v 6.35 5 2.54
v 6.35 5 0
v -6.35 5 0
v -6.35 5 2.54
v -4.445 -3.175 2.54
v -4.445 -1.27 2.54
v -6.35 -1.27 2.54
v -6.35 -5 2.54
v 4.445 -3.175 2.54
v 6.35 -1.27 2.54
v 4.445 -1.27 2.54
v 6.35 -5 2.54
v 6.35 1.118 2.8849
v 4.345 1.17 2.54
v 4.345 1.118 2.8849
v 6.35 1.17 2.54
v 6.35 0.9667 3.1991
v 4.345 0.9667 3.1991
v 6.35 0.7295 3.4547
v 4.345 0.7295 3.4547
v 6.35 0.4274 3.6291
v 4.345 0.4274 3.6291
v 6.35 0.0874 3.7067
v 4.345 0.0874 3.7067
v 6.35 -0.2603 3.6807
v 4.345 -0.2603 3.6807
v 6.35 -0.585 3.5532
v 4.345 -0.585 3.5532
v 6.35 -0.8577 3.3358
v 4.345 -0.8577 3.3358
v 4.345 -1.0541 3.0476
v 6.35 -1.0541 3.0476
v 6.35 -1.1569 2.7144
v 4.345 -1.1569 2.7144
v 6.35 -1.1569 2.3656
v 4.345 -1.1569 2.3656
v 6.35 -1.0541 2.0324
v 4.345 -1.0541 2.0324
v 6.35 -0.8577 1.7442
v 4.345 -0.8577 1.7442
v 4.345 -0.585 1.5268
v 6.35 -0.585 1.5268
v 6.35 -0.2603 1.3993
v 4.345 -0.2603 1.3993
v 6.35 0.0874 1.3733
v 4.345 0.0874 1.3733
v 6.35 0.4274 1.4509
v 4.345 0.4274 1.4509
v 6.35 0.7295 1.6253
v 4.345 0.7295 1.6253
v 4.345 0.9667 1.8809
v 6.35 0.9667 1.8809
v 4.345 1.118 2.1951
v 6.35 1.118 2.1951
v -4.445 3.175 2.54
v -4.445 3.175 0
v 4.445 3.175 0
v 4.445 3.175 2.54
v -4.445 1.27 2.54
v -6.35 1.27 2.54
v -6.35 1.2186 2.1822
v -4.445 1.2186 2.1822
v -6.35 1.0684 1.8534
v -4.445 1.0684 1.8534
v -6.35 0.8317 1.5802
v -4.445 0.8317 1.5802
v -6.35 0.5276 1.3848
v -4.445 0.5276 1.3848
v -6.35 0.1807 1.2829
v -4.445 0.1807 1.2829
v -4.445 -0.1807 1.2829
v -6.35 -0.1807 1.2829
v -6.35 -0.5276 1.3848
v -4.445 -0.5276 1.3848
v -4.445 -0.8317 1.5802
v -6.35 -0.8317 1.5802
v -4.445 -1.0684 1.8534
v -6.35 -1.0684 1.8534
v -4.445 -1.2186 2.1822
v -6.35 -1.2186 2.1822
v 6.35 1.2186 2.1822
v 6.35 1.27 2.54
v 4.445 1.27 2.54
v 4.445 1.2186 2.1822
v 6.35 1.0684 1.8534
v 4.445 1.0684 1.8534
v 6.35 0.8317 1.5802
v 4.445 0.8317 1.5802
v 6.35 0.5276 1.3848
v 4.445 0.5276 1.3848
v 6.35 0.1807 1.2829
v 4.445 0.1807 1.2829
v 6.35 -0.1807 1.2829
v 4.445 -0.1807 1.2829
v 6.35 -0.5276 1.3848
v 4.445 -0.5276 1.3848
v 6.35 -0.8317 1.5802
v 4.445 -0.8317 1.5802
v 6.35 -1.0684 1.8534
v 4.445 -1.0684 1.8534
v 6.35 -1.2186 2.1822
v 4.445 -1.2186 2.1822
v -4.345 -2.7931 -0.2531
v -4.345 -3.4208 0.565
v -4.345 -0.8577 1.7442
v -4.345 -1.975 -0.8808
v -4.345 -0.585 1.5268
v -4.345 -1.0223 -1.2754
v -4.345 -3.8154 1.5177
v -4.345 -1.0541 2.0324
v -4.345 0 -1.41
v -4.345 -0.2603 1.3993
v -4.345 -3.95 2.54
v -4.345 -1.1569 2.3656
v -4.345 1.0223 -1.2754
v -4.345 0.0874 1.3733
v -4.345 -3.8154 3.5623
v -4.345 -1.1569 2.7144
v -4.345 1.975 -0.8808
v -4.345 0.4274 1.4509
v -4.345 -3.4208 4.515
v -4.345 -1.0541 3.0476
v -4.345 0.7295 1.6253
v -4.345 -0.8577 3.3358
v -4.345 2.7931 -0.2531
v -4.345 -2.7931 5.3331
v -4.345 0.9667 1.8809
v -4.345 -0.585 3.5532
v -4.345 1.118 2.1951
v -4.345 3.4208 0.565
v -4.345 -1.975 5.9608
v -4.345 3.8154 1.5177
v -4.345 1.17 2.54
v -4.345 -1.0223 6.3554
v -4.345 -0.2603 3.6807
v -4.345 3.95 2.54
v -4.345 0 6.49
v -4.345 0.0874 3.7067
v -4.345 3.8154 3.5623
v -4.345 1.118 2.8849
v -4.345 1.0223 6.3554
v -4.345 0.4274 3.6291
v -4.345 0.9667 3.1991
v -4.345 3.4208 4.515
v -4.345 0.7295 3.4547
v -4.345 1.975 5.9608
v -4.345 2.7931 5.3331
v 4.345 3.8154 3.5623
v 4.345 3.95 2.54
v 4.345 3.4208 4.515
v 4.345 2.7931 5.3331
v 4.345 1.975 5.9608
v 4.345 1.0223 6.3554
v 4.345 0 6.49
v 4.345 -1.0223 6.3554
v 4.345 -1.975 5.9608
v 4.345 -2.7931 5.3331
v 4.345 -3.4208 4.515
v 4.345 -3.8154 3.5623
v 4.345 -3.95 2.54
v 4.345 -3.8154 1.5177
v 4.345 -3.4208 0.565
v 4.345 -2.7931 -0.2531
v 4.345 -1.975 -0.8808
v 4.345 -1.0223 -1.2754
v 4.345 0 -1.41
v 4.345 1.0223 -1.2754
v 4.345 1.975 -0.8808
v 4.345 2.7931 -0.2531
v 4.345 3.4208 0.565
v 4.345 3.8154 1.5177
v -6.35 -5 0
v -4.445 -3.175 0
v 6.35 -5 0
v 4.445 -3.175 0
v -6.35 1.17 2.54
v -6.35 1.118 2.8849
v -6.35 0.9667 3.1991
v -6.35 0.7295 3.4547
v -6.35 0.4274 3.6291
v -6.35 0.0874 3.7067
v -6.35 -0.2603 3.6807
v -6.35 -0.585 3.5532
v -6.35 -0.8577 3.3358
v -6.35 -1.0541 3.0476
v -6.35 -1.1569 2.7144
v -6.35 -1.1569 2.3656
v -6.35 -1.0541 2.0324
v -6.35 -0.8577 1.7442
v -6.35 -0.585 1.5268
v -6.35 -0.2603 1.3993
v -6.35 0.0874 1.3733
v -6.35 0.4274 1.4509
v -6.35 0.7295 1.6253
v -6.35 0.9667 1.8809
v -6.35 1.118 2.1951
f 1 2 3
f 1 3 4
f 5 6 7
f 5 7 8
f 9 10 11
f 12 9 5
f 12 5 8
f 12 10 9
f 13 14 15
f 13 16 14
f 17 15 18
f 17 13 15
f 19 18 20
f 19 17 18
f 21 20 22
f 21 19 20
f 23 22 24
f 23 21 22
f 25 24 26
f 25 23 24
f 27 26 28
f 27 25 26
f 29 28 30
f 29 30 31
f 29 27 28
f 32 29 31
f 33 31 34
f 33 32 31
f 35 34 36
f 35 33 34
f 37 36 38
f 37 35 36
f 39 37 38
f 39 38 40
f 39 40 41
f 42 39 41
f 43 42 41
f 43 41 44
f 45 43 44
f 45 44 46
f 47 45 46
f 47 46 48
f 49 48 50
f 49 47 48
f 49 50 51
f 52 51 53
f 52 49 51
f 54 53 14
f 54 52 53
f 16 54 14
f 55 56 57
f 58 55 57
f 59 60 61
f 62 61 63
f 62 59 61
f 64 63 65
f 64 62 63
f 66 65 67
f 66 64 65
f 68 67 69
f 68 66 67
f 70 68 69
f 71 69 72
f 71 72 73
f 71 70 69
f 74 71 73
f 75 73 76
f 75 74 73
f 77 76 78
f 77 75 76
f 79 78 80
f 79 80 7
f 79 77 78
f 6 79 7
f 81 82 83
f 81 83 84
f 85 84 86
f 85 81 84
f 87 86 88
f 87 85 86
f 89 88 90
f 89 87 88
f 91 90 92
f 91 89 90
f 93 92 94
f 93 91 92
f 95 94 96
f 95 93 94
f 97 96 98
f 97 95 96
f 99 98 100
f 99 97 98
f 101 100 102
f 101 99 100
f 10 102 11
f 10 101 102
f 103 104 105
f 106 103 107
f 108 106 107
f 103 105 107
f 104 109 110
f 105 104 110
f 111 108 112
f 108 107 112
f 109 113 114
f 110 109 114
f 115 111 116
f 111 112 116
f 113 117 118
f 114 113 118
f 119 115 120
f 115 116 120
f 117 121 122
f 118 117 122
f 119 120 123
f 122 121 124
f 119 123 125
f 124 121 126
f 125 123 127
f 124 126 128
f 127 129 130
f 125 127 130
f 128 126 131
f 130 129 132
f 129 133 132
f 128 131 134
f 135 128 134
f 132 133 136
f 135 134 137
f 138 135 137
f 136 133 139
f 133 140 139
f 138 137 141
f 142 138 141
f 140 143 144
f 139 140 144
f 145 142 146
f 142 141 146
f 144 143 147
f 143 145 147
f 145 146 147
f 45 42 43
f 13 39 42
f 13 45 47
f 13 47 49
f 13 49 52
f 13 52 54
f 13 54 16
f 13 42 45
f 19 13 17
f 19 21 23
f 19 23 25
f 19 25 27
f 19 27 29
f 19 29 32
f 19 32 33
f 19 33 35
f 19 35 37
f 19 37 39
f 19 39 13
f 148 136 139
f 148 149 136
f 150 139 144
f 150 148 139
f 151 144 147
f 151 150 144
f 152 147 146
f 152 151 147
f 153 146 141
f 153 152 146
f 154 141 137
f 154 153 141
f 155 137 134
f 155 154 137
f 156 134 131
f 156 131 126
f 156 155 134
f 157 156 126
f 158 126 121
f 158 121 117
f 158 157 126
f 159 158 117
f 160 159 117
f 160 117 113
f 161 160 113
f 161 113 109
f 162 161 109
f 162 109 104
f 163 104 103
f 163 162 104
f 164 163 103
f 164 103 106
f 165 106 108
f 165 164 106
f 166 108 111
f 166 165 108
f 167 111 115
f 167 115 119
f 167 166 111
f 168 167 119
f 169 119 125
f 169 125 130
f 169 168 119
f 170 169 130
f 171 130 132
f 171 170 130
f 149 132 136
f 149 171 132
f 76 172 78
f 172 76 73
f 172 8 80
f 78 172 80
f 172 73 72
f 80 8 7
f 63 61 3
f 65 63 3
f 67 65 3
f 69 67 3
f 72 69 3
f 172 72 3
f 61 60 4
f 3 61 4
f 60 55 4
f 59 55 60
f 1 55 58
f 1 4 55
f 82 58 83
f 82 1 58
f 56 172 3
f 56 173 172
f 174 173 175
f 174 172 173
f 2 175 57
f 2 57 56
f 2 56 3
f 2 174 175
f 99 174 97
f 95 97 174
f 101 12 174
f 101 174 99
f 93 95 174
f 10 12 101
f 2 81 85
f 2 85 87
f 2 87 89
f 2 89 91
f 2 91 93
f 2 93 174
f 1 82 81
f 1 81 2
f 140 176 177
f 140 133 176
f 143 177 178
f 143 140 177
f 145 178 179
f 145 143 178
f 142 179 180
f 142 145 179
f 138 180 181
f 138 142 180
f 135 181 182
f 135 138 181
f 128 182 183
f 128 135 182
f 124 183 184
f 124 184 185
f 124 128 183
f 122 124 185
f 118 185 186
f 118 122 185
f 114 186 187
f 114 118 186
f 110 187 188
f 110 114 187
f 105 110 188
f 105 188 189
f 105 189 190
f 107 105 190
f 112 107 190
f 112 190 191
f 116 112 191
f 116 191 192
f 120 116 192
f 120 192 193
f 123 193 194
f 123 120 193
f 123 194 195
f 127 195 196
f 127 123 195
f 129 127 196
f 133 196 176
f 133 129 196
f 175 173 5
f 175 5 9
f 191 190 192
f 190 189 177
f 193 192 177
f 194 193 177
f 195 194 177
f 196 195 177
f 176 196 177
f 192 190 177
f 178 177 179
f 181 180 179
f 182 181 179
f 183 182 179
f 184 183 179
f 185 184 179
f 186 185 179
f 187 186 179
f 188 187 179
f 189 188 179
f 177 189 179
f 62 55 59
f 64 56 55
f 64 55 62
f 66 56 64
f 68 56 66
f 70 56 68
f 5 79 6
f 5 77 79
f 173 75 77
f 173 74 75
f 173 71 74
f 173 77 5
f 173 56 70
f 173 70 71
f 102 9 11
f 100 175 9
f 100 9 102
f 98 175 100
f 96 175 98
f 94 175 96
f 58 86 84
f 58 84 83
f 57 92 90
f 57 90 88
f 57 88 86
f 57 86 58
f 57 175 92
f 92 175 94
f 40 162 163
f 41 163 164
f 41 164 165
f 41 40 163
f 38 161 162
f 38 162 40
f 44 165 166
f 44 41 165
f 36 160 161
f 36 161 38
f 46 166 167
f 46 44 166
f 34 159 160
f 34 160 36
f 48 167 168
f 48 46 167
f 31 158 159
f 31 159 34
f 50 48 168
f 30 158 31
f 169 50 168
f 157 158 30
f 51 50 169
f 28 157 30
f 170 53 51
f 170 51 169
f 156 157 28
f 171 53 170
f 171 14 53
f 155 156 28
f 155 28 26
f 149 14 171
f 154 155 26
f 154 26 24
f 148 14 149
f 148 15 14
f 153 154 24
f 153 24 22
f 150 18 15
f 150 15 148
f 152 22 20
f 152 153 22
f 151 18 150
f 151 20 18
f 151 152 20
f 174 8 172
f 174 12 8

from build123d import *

# Parameters (mm, degrees)
F1_DEPTH      = 6.35
F1_DEPTH_BACK = 6.35
F2_W          = 8.89
F2_H          = 1.905
F2_H_2        = 2.54
F3_DEPTH      = 2.54
F4_R          = 1.17
F5_DEPTH      = 6.35
F5_DEPTH_BACK = 6.35
F6_R          = 3.95
F7_DEPTH      = 4.345
F7_DEPTH_BACK = 4.345


with BuildPart() as f1:
    # F0 (on Right) → F1 (new body, two sides)
    with BuildSketch(Plane.YZ) as f1_sk:
        with BuildLine():
            Line((-5, 0), (0, 0))
            Line((0, 0), (5, 0))
            Line((5, 0), (5, 2.54))
            Line((5, 2.54), (1.27, 2.54))
            ThreePointArc((1.27, 2.54), (0, 1.27), (-1.27, 2.54))
            Line((-1.27, 2.54), (-5, 2.54))
            Line((-5, 2.54), (-5, 0))
        make_face()
    extrude(amount=F1_DEPTH)
    extrude(f1_sk.sketch, amount=-F1_DEPTH_BACK)

    # F2 (on Top) → F3 (cut, through all)
    with BuildSketch(Plane.XY):
        with Locations((0, -2.2225)):
            Rectangle(F2_W, F2_H)
        Rectangle(F2_W, F2_H_2)
        with Locations((0, 2.2225)):
            Rectangle(F2_W, F2_H)
    extrude(amount=F3_DEPTH, mode=Mode.SUBTRACT)


with BuildPart() as f5:
    # F4 (on Right) → F5 (new body, two sides)
    with BuildSketch(Plane.YZ) as f5_sk:
        with Locations((0, 2.54)):
            Circle(F4_R)
    extrude(amount=F5_DEPTH)
    extrude(f5_sk.sketch, amount=-F5_DEPTH_BACK)

    # F6 (on Right) → F7 (join, two sides)
    with BuildSketch(Plane.YZ) as f7_sk:
        with Locations((0, 2.54)):
            Circle(F6_R)
    extrude(amount=F7_DEPTH)
    extrude(f7_sk.sketch, amount=-F7_DEPTH_BACK)


solid = Compound([f1.part, f5.part])
